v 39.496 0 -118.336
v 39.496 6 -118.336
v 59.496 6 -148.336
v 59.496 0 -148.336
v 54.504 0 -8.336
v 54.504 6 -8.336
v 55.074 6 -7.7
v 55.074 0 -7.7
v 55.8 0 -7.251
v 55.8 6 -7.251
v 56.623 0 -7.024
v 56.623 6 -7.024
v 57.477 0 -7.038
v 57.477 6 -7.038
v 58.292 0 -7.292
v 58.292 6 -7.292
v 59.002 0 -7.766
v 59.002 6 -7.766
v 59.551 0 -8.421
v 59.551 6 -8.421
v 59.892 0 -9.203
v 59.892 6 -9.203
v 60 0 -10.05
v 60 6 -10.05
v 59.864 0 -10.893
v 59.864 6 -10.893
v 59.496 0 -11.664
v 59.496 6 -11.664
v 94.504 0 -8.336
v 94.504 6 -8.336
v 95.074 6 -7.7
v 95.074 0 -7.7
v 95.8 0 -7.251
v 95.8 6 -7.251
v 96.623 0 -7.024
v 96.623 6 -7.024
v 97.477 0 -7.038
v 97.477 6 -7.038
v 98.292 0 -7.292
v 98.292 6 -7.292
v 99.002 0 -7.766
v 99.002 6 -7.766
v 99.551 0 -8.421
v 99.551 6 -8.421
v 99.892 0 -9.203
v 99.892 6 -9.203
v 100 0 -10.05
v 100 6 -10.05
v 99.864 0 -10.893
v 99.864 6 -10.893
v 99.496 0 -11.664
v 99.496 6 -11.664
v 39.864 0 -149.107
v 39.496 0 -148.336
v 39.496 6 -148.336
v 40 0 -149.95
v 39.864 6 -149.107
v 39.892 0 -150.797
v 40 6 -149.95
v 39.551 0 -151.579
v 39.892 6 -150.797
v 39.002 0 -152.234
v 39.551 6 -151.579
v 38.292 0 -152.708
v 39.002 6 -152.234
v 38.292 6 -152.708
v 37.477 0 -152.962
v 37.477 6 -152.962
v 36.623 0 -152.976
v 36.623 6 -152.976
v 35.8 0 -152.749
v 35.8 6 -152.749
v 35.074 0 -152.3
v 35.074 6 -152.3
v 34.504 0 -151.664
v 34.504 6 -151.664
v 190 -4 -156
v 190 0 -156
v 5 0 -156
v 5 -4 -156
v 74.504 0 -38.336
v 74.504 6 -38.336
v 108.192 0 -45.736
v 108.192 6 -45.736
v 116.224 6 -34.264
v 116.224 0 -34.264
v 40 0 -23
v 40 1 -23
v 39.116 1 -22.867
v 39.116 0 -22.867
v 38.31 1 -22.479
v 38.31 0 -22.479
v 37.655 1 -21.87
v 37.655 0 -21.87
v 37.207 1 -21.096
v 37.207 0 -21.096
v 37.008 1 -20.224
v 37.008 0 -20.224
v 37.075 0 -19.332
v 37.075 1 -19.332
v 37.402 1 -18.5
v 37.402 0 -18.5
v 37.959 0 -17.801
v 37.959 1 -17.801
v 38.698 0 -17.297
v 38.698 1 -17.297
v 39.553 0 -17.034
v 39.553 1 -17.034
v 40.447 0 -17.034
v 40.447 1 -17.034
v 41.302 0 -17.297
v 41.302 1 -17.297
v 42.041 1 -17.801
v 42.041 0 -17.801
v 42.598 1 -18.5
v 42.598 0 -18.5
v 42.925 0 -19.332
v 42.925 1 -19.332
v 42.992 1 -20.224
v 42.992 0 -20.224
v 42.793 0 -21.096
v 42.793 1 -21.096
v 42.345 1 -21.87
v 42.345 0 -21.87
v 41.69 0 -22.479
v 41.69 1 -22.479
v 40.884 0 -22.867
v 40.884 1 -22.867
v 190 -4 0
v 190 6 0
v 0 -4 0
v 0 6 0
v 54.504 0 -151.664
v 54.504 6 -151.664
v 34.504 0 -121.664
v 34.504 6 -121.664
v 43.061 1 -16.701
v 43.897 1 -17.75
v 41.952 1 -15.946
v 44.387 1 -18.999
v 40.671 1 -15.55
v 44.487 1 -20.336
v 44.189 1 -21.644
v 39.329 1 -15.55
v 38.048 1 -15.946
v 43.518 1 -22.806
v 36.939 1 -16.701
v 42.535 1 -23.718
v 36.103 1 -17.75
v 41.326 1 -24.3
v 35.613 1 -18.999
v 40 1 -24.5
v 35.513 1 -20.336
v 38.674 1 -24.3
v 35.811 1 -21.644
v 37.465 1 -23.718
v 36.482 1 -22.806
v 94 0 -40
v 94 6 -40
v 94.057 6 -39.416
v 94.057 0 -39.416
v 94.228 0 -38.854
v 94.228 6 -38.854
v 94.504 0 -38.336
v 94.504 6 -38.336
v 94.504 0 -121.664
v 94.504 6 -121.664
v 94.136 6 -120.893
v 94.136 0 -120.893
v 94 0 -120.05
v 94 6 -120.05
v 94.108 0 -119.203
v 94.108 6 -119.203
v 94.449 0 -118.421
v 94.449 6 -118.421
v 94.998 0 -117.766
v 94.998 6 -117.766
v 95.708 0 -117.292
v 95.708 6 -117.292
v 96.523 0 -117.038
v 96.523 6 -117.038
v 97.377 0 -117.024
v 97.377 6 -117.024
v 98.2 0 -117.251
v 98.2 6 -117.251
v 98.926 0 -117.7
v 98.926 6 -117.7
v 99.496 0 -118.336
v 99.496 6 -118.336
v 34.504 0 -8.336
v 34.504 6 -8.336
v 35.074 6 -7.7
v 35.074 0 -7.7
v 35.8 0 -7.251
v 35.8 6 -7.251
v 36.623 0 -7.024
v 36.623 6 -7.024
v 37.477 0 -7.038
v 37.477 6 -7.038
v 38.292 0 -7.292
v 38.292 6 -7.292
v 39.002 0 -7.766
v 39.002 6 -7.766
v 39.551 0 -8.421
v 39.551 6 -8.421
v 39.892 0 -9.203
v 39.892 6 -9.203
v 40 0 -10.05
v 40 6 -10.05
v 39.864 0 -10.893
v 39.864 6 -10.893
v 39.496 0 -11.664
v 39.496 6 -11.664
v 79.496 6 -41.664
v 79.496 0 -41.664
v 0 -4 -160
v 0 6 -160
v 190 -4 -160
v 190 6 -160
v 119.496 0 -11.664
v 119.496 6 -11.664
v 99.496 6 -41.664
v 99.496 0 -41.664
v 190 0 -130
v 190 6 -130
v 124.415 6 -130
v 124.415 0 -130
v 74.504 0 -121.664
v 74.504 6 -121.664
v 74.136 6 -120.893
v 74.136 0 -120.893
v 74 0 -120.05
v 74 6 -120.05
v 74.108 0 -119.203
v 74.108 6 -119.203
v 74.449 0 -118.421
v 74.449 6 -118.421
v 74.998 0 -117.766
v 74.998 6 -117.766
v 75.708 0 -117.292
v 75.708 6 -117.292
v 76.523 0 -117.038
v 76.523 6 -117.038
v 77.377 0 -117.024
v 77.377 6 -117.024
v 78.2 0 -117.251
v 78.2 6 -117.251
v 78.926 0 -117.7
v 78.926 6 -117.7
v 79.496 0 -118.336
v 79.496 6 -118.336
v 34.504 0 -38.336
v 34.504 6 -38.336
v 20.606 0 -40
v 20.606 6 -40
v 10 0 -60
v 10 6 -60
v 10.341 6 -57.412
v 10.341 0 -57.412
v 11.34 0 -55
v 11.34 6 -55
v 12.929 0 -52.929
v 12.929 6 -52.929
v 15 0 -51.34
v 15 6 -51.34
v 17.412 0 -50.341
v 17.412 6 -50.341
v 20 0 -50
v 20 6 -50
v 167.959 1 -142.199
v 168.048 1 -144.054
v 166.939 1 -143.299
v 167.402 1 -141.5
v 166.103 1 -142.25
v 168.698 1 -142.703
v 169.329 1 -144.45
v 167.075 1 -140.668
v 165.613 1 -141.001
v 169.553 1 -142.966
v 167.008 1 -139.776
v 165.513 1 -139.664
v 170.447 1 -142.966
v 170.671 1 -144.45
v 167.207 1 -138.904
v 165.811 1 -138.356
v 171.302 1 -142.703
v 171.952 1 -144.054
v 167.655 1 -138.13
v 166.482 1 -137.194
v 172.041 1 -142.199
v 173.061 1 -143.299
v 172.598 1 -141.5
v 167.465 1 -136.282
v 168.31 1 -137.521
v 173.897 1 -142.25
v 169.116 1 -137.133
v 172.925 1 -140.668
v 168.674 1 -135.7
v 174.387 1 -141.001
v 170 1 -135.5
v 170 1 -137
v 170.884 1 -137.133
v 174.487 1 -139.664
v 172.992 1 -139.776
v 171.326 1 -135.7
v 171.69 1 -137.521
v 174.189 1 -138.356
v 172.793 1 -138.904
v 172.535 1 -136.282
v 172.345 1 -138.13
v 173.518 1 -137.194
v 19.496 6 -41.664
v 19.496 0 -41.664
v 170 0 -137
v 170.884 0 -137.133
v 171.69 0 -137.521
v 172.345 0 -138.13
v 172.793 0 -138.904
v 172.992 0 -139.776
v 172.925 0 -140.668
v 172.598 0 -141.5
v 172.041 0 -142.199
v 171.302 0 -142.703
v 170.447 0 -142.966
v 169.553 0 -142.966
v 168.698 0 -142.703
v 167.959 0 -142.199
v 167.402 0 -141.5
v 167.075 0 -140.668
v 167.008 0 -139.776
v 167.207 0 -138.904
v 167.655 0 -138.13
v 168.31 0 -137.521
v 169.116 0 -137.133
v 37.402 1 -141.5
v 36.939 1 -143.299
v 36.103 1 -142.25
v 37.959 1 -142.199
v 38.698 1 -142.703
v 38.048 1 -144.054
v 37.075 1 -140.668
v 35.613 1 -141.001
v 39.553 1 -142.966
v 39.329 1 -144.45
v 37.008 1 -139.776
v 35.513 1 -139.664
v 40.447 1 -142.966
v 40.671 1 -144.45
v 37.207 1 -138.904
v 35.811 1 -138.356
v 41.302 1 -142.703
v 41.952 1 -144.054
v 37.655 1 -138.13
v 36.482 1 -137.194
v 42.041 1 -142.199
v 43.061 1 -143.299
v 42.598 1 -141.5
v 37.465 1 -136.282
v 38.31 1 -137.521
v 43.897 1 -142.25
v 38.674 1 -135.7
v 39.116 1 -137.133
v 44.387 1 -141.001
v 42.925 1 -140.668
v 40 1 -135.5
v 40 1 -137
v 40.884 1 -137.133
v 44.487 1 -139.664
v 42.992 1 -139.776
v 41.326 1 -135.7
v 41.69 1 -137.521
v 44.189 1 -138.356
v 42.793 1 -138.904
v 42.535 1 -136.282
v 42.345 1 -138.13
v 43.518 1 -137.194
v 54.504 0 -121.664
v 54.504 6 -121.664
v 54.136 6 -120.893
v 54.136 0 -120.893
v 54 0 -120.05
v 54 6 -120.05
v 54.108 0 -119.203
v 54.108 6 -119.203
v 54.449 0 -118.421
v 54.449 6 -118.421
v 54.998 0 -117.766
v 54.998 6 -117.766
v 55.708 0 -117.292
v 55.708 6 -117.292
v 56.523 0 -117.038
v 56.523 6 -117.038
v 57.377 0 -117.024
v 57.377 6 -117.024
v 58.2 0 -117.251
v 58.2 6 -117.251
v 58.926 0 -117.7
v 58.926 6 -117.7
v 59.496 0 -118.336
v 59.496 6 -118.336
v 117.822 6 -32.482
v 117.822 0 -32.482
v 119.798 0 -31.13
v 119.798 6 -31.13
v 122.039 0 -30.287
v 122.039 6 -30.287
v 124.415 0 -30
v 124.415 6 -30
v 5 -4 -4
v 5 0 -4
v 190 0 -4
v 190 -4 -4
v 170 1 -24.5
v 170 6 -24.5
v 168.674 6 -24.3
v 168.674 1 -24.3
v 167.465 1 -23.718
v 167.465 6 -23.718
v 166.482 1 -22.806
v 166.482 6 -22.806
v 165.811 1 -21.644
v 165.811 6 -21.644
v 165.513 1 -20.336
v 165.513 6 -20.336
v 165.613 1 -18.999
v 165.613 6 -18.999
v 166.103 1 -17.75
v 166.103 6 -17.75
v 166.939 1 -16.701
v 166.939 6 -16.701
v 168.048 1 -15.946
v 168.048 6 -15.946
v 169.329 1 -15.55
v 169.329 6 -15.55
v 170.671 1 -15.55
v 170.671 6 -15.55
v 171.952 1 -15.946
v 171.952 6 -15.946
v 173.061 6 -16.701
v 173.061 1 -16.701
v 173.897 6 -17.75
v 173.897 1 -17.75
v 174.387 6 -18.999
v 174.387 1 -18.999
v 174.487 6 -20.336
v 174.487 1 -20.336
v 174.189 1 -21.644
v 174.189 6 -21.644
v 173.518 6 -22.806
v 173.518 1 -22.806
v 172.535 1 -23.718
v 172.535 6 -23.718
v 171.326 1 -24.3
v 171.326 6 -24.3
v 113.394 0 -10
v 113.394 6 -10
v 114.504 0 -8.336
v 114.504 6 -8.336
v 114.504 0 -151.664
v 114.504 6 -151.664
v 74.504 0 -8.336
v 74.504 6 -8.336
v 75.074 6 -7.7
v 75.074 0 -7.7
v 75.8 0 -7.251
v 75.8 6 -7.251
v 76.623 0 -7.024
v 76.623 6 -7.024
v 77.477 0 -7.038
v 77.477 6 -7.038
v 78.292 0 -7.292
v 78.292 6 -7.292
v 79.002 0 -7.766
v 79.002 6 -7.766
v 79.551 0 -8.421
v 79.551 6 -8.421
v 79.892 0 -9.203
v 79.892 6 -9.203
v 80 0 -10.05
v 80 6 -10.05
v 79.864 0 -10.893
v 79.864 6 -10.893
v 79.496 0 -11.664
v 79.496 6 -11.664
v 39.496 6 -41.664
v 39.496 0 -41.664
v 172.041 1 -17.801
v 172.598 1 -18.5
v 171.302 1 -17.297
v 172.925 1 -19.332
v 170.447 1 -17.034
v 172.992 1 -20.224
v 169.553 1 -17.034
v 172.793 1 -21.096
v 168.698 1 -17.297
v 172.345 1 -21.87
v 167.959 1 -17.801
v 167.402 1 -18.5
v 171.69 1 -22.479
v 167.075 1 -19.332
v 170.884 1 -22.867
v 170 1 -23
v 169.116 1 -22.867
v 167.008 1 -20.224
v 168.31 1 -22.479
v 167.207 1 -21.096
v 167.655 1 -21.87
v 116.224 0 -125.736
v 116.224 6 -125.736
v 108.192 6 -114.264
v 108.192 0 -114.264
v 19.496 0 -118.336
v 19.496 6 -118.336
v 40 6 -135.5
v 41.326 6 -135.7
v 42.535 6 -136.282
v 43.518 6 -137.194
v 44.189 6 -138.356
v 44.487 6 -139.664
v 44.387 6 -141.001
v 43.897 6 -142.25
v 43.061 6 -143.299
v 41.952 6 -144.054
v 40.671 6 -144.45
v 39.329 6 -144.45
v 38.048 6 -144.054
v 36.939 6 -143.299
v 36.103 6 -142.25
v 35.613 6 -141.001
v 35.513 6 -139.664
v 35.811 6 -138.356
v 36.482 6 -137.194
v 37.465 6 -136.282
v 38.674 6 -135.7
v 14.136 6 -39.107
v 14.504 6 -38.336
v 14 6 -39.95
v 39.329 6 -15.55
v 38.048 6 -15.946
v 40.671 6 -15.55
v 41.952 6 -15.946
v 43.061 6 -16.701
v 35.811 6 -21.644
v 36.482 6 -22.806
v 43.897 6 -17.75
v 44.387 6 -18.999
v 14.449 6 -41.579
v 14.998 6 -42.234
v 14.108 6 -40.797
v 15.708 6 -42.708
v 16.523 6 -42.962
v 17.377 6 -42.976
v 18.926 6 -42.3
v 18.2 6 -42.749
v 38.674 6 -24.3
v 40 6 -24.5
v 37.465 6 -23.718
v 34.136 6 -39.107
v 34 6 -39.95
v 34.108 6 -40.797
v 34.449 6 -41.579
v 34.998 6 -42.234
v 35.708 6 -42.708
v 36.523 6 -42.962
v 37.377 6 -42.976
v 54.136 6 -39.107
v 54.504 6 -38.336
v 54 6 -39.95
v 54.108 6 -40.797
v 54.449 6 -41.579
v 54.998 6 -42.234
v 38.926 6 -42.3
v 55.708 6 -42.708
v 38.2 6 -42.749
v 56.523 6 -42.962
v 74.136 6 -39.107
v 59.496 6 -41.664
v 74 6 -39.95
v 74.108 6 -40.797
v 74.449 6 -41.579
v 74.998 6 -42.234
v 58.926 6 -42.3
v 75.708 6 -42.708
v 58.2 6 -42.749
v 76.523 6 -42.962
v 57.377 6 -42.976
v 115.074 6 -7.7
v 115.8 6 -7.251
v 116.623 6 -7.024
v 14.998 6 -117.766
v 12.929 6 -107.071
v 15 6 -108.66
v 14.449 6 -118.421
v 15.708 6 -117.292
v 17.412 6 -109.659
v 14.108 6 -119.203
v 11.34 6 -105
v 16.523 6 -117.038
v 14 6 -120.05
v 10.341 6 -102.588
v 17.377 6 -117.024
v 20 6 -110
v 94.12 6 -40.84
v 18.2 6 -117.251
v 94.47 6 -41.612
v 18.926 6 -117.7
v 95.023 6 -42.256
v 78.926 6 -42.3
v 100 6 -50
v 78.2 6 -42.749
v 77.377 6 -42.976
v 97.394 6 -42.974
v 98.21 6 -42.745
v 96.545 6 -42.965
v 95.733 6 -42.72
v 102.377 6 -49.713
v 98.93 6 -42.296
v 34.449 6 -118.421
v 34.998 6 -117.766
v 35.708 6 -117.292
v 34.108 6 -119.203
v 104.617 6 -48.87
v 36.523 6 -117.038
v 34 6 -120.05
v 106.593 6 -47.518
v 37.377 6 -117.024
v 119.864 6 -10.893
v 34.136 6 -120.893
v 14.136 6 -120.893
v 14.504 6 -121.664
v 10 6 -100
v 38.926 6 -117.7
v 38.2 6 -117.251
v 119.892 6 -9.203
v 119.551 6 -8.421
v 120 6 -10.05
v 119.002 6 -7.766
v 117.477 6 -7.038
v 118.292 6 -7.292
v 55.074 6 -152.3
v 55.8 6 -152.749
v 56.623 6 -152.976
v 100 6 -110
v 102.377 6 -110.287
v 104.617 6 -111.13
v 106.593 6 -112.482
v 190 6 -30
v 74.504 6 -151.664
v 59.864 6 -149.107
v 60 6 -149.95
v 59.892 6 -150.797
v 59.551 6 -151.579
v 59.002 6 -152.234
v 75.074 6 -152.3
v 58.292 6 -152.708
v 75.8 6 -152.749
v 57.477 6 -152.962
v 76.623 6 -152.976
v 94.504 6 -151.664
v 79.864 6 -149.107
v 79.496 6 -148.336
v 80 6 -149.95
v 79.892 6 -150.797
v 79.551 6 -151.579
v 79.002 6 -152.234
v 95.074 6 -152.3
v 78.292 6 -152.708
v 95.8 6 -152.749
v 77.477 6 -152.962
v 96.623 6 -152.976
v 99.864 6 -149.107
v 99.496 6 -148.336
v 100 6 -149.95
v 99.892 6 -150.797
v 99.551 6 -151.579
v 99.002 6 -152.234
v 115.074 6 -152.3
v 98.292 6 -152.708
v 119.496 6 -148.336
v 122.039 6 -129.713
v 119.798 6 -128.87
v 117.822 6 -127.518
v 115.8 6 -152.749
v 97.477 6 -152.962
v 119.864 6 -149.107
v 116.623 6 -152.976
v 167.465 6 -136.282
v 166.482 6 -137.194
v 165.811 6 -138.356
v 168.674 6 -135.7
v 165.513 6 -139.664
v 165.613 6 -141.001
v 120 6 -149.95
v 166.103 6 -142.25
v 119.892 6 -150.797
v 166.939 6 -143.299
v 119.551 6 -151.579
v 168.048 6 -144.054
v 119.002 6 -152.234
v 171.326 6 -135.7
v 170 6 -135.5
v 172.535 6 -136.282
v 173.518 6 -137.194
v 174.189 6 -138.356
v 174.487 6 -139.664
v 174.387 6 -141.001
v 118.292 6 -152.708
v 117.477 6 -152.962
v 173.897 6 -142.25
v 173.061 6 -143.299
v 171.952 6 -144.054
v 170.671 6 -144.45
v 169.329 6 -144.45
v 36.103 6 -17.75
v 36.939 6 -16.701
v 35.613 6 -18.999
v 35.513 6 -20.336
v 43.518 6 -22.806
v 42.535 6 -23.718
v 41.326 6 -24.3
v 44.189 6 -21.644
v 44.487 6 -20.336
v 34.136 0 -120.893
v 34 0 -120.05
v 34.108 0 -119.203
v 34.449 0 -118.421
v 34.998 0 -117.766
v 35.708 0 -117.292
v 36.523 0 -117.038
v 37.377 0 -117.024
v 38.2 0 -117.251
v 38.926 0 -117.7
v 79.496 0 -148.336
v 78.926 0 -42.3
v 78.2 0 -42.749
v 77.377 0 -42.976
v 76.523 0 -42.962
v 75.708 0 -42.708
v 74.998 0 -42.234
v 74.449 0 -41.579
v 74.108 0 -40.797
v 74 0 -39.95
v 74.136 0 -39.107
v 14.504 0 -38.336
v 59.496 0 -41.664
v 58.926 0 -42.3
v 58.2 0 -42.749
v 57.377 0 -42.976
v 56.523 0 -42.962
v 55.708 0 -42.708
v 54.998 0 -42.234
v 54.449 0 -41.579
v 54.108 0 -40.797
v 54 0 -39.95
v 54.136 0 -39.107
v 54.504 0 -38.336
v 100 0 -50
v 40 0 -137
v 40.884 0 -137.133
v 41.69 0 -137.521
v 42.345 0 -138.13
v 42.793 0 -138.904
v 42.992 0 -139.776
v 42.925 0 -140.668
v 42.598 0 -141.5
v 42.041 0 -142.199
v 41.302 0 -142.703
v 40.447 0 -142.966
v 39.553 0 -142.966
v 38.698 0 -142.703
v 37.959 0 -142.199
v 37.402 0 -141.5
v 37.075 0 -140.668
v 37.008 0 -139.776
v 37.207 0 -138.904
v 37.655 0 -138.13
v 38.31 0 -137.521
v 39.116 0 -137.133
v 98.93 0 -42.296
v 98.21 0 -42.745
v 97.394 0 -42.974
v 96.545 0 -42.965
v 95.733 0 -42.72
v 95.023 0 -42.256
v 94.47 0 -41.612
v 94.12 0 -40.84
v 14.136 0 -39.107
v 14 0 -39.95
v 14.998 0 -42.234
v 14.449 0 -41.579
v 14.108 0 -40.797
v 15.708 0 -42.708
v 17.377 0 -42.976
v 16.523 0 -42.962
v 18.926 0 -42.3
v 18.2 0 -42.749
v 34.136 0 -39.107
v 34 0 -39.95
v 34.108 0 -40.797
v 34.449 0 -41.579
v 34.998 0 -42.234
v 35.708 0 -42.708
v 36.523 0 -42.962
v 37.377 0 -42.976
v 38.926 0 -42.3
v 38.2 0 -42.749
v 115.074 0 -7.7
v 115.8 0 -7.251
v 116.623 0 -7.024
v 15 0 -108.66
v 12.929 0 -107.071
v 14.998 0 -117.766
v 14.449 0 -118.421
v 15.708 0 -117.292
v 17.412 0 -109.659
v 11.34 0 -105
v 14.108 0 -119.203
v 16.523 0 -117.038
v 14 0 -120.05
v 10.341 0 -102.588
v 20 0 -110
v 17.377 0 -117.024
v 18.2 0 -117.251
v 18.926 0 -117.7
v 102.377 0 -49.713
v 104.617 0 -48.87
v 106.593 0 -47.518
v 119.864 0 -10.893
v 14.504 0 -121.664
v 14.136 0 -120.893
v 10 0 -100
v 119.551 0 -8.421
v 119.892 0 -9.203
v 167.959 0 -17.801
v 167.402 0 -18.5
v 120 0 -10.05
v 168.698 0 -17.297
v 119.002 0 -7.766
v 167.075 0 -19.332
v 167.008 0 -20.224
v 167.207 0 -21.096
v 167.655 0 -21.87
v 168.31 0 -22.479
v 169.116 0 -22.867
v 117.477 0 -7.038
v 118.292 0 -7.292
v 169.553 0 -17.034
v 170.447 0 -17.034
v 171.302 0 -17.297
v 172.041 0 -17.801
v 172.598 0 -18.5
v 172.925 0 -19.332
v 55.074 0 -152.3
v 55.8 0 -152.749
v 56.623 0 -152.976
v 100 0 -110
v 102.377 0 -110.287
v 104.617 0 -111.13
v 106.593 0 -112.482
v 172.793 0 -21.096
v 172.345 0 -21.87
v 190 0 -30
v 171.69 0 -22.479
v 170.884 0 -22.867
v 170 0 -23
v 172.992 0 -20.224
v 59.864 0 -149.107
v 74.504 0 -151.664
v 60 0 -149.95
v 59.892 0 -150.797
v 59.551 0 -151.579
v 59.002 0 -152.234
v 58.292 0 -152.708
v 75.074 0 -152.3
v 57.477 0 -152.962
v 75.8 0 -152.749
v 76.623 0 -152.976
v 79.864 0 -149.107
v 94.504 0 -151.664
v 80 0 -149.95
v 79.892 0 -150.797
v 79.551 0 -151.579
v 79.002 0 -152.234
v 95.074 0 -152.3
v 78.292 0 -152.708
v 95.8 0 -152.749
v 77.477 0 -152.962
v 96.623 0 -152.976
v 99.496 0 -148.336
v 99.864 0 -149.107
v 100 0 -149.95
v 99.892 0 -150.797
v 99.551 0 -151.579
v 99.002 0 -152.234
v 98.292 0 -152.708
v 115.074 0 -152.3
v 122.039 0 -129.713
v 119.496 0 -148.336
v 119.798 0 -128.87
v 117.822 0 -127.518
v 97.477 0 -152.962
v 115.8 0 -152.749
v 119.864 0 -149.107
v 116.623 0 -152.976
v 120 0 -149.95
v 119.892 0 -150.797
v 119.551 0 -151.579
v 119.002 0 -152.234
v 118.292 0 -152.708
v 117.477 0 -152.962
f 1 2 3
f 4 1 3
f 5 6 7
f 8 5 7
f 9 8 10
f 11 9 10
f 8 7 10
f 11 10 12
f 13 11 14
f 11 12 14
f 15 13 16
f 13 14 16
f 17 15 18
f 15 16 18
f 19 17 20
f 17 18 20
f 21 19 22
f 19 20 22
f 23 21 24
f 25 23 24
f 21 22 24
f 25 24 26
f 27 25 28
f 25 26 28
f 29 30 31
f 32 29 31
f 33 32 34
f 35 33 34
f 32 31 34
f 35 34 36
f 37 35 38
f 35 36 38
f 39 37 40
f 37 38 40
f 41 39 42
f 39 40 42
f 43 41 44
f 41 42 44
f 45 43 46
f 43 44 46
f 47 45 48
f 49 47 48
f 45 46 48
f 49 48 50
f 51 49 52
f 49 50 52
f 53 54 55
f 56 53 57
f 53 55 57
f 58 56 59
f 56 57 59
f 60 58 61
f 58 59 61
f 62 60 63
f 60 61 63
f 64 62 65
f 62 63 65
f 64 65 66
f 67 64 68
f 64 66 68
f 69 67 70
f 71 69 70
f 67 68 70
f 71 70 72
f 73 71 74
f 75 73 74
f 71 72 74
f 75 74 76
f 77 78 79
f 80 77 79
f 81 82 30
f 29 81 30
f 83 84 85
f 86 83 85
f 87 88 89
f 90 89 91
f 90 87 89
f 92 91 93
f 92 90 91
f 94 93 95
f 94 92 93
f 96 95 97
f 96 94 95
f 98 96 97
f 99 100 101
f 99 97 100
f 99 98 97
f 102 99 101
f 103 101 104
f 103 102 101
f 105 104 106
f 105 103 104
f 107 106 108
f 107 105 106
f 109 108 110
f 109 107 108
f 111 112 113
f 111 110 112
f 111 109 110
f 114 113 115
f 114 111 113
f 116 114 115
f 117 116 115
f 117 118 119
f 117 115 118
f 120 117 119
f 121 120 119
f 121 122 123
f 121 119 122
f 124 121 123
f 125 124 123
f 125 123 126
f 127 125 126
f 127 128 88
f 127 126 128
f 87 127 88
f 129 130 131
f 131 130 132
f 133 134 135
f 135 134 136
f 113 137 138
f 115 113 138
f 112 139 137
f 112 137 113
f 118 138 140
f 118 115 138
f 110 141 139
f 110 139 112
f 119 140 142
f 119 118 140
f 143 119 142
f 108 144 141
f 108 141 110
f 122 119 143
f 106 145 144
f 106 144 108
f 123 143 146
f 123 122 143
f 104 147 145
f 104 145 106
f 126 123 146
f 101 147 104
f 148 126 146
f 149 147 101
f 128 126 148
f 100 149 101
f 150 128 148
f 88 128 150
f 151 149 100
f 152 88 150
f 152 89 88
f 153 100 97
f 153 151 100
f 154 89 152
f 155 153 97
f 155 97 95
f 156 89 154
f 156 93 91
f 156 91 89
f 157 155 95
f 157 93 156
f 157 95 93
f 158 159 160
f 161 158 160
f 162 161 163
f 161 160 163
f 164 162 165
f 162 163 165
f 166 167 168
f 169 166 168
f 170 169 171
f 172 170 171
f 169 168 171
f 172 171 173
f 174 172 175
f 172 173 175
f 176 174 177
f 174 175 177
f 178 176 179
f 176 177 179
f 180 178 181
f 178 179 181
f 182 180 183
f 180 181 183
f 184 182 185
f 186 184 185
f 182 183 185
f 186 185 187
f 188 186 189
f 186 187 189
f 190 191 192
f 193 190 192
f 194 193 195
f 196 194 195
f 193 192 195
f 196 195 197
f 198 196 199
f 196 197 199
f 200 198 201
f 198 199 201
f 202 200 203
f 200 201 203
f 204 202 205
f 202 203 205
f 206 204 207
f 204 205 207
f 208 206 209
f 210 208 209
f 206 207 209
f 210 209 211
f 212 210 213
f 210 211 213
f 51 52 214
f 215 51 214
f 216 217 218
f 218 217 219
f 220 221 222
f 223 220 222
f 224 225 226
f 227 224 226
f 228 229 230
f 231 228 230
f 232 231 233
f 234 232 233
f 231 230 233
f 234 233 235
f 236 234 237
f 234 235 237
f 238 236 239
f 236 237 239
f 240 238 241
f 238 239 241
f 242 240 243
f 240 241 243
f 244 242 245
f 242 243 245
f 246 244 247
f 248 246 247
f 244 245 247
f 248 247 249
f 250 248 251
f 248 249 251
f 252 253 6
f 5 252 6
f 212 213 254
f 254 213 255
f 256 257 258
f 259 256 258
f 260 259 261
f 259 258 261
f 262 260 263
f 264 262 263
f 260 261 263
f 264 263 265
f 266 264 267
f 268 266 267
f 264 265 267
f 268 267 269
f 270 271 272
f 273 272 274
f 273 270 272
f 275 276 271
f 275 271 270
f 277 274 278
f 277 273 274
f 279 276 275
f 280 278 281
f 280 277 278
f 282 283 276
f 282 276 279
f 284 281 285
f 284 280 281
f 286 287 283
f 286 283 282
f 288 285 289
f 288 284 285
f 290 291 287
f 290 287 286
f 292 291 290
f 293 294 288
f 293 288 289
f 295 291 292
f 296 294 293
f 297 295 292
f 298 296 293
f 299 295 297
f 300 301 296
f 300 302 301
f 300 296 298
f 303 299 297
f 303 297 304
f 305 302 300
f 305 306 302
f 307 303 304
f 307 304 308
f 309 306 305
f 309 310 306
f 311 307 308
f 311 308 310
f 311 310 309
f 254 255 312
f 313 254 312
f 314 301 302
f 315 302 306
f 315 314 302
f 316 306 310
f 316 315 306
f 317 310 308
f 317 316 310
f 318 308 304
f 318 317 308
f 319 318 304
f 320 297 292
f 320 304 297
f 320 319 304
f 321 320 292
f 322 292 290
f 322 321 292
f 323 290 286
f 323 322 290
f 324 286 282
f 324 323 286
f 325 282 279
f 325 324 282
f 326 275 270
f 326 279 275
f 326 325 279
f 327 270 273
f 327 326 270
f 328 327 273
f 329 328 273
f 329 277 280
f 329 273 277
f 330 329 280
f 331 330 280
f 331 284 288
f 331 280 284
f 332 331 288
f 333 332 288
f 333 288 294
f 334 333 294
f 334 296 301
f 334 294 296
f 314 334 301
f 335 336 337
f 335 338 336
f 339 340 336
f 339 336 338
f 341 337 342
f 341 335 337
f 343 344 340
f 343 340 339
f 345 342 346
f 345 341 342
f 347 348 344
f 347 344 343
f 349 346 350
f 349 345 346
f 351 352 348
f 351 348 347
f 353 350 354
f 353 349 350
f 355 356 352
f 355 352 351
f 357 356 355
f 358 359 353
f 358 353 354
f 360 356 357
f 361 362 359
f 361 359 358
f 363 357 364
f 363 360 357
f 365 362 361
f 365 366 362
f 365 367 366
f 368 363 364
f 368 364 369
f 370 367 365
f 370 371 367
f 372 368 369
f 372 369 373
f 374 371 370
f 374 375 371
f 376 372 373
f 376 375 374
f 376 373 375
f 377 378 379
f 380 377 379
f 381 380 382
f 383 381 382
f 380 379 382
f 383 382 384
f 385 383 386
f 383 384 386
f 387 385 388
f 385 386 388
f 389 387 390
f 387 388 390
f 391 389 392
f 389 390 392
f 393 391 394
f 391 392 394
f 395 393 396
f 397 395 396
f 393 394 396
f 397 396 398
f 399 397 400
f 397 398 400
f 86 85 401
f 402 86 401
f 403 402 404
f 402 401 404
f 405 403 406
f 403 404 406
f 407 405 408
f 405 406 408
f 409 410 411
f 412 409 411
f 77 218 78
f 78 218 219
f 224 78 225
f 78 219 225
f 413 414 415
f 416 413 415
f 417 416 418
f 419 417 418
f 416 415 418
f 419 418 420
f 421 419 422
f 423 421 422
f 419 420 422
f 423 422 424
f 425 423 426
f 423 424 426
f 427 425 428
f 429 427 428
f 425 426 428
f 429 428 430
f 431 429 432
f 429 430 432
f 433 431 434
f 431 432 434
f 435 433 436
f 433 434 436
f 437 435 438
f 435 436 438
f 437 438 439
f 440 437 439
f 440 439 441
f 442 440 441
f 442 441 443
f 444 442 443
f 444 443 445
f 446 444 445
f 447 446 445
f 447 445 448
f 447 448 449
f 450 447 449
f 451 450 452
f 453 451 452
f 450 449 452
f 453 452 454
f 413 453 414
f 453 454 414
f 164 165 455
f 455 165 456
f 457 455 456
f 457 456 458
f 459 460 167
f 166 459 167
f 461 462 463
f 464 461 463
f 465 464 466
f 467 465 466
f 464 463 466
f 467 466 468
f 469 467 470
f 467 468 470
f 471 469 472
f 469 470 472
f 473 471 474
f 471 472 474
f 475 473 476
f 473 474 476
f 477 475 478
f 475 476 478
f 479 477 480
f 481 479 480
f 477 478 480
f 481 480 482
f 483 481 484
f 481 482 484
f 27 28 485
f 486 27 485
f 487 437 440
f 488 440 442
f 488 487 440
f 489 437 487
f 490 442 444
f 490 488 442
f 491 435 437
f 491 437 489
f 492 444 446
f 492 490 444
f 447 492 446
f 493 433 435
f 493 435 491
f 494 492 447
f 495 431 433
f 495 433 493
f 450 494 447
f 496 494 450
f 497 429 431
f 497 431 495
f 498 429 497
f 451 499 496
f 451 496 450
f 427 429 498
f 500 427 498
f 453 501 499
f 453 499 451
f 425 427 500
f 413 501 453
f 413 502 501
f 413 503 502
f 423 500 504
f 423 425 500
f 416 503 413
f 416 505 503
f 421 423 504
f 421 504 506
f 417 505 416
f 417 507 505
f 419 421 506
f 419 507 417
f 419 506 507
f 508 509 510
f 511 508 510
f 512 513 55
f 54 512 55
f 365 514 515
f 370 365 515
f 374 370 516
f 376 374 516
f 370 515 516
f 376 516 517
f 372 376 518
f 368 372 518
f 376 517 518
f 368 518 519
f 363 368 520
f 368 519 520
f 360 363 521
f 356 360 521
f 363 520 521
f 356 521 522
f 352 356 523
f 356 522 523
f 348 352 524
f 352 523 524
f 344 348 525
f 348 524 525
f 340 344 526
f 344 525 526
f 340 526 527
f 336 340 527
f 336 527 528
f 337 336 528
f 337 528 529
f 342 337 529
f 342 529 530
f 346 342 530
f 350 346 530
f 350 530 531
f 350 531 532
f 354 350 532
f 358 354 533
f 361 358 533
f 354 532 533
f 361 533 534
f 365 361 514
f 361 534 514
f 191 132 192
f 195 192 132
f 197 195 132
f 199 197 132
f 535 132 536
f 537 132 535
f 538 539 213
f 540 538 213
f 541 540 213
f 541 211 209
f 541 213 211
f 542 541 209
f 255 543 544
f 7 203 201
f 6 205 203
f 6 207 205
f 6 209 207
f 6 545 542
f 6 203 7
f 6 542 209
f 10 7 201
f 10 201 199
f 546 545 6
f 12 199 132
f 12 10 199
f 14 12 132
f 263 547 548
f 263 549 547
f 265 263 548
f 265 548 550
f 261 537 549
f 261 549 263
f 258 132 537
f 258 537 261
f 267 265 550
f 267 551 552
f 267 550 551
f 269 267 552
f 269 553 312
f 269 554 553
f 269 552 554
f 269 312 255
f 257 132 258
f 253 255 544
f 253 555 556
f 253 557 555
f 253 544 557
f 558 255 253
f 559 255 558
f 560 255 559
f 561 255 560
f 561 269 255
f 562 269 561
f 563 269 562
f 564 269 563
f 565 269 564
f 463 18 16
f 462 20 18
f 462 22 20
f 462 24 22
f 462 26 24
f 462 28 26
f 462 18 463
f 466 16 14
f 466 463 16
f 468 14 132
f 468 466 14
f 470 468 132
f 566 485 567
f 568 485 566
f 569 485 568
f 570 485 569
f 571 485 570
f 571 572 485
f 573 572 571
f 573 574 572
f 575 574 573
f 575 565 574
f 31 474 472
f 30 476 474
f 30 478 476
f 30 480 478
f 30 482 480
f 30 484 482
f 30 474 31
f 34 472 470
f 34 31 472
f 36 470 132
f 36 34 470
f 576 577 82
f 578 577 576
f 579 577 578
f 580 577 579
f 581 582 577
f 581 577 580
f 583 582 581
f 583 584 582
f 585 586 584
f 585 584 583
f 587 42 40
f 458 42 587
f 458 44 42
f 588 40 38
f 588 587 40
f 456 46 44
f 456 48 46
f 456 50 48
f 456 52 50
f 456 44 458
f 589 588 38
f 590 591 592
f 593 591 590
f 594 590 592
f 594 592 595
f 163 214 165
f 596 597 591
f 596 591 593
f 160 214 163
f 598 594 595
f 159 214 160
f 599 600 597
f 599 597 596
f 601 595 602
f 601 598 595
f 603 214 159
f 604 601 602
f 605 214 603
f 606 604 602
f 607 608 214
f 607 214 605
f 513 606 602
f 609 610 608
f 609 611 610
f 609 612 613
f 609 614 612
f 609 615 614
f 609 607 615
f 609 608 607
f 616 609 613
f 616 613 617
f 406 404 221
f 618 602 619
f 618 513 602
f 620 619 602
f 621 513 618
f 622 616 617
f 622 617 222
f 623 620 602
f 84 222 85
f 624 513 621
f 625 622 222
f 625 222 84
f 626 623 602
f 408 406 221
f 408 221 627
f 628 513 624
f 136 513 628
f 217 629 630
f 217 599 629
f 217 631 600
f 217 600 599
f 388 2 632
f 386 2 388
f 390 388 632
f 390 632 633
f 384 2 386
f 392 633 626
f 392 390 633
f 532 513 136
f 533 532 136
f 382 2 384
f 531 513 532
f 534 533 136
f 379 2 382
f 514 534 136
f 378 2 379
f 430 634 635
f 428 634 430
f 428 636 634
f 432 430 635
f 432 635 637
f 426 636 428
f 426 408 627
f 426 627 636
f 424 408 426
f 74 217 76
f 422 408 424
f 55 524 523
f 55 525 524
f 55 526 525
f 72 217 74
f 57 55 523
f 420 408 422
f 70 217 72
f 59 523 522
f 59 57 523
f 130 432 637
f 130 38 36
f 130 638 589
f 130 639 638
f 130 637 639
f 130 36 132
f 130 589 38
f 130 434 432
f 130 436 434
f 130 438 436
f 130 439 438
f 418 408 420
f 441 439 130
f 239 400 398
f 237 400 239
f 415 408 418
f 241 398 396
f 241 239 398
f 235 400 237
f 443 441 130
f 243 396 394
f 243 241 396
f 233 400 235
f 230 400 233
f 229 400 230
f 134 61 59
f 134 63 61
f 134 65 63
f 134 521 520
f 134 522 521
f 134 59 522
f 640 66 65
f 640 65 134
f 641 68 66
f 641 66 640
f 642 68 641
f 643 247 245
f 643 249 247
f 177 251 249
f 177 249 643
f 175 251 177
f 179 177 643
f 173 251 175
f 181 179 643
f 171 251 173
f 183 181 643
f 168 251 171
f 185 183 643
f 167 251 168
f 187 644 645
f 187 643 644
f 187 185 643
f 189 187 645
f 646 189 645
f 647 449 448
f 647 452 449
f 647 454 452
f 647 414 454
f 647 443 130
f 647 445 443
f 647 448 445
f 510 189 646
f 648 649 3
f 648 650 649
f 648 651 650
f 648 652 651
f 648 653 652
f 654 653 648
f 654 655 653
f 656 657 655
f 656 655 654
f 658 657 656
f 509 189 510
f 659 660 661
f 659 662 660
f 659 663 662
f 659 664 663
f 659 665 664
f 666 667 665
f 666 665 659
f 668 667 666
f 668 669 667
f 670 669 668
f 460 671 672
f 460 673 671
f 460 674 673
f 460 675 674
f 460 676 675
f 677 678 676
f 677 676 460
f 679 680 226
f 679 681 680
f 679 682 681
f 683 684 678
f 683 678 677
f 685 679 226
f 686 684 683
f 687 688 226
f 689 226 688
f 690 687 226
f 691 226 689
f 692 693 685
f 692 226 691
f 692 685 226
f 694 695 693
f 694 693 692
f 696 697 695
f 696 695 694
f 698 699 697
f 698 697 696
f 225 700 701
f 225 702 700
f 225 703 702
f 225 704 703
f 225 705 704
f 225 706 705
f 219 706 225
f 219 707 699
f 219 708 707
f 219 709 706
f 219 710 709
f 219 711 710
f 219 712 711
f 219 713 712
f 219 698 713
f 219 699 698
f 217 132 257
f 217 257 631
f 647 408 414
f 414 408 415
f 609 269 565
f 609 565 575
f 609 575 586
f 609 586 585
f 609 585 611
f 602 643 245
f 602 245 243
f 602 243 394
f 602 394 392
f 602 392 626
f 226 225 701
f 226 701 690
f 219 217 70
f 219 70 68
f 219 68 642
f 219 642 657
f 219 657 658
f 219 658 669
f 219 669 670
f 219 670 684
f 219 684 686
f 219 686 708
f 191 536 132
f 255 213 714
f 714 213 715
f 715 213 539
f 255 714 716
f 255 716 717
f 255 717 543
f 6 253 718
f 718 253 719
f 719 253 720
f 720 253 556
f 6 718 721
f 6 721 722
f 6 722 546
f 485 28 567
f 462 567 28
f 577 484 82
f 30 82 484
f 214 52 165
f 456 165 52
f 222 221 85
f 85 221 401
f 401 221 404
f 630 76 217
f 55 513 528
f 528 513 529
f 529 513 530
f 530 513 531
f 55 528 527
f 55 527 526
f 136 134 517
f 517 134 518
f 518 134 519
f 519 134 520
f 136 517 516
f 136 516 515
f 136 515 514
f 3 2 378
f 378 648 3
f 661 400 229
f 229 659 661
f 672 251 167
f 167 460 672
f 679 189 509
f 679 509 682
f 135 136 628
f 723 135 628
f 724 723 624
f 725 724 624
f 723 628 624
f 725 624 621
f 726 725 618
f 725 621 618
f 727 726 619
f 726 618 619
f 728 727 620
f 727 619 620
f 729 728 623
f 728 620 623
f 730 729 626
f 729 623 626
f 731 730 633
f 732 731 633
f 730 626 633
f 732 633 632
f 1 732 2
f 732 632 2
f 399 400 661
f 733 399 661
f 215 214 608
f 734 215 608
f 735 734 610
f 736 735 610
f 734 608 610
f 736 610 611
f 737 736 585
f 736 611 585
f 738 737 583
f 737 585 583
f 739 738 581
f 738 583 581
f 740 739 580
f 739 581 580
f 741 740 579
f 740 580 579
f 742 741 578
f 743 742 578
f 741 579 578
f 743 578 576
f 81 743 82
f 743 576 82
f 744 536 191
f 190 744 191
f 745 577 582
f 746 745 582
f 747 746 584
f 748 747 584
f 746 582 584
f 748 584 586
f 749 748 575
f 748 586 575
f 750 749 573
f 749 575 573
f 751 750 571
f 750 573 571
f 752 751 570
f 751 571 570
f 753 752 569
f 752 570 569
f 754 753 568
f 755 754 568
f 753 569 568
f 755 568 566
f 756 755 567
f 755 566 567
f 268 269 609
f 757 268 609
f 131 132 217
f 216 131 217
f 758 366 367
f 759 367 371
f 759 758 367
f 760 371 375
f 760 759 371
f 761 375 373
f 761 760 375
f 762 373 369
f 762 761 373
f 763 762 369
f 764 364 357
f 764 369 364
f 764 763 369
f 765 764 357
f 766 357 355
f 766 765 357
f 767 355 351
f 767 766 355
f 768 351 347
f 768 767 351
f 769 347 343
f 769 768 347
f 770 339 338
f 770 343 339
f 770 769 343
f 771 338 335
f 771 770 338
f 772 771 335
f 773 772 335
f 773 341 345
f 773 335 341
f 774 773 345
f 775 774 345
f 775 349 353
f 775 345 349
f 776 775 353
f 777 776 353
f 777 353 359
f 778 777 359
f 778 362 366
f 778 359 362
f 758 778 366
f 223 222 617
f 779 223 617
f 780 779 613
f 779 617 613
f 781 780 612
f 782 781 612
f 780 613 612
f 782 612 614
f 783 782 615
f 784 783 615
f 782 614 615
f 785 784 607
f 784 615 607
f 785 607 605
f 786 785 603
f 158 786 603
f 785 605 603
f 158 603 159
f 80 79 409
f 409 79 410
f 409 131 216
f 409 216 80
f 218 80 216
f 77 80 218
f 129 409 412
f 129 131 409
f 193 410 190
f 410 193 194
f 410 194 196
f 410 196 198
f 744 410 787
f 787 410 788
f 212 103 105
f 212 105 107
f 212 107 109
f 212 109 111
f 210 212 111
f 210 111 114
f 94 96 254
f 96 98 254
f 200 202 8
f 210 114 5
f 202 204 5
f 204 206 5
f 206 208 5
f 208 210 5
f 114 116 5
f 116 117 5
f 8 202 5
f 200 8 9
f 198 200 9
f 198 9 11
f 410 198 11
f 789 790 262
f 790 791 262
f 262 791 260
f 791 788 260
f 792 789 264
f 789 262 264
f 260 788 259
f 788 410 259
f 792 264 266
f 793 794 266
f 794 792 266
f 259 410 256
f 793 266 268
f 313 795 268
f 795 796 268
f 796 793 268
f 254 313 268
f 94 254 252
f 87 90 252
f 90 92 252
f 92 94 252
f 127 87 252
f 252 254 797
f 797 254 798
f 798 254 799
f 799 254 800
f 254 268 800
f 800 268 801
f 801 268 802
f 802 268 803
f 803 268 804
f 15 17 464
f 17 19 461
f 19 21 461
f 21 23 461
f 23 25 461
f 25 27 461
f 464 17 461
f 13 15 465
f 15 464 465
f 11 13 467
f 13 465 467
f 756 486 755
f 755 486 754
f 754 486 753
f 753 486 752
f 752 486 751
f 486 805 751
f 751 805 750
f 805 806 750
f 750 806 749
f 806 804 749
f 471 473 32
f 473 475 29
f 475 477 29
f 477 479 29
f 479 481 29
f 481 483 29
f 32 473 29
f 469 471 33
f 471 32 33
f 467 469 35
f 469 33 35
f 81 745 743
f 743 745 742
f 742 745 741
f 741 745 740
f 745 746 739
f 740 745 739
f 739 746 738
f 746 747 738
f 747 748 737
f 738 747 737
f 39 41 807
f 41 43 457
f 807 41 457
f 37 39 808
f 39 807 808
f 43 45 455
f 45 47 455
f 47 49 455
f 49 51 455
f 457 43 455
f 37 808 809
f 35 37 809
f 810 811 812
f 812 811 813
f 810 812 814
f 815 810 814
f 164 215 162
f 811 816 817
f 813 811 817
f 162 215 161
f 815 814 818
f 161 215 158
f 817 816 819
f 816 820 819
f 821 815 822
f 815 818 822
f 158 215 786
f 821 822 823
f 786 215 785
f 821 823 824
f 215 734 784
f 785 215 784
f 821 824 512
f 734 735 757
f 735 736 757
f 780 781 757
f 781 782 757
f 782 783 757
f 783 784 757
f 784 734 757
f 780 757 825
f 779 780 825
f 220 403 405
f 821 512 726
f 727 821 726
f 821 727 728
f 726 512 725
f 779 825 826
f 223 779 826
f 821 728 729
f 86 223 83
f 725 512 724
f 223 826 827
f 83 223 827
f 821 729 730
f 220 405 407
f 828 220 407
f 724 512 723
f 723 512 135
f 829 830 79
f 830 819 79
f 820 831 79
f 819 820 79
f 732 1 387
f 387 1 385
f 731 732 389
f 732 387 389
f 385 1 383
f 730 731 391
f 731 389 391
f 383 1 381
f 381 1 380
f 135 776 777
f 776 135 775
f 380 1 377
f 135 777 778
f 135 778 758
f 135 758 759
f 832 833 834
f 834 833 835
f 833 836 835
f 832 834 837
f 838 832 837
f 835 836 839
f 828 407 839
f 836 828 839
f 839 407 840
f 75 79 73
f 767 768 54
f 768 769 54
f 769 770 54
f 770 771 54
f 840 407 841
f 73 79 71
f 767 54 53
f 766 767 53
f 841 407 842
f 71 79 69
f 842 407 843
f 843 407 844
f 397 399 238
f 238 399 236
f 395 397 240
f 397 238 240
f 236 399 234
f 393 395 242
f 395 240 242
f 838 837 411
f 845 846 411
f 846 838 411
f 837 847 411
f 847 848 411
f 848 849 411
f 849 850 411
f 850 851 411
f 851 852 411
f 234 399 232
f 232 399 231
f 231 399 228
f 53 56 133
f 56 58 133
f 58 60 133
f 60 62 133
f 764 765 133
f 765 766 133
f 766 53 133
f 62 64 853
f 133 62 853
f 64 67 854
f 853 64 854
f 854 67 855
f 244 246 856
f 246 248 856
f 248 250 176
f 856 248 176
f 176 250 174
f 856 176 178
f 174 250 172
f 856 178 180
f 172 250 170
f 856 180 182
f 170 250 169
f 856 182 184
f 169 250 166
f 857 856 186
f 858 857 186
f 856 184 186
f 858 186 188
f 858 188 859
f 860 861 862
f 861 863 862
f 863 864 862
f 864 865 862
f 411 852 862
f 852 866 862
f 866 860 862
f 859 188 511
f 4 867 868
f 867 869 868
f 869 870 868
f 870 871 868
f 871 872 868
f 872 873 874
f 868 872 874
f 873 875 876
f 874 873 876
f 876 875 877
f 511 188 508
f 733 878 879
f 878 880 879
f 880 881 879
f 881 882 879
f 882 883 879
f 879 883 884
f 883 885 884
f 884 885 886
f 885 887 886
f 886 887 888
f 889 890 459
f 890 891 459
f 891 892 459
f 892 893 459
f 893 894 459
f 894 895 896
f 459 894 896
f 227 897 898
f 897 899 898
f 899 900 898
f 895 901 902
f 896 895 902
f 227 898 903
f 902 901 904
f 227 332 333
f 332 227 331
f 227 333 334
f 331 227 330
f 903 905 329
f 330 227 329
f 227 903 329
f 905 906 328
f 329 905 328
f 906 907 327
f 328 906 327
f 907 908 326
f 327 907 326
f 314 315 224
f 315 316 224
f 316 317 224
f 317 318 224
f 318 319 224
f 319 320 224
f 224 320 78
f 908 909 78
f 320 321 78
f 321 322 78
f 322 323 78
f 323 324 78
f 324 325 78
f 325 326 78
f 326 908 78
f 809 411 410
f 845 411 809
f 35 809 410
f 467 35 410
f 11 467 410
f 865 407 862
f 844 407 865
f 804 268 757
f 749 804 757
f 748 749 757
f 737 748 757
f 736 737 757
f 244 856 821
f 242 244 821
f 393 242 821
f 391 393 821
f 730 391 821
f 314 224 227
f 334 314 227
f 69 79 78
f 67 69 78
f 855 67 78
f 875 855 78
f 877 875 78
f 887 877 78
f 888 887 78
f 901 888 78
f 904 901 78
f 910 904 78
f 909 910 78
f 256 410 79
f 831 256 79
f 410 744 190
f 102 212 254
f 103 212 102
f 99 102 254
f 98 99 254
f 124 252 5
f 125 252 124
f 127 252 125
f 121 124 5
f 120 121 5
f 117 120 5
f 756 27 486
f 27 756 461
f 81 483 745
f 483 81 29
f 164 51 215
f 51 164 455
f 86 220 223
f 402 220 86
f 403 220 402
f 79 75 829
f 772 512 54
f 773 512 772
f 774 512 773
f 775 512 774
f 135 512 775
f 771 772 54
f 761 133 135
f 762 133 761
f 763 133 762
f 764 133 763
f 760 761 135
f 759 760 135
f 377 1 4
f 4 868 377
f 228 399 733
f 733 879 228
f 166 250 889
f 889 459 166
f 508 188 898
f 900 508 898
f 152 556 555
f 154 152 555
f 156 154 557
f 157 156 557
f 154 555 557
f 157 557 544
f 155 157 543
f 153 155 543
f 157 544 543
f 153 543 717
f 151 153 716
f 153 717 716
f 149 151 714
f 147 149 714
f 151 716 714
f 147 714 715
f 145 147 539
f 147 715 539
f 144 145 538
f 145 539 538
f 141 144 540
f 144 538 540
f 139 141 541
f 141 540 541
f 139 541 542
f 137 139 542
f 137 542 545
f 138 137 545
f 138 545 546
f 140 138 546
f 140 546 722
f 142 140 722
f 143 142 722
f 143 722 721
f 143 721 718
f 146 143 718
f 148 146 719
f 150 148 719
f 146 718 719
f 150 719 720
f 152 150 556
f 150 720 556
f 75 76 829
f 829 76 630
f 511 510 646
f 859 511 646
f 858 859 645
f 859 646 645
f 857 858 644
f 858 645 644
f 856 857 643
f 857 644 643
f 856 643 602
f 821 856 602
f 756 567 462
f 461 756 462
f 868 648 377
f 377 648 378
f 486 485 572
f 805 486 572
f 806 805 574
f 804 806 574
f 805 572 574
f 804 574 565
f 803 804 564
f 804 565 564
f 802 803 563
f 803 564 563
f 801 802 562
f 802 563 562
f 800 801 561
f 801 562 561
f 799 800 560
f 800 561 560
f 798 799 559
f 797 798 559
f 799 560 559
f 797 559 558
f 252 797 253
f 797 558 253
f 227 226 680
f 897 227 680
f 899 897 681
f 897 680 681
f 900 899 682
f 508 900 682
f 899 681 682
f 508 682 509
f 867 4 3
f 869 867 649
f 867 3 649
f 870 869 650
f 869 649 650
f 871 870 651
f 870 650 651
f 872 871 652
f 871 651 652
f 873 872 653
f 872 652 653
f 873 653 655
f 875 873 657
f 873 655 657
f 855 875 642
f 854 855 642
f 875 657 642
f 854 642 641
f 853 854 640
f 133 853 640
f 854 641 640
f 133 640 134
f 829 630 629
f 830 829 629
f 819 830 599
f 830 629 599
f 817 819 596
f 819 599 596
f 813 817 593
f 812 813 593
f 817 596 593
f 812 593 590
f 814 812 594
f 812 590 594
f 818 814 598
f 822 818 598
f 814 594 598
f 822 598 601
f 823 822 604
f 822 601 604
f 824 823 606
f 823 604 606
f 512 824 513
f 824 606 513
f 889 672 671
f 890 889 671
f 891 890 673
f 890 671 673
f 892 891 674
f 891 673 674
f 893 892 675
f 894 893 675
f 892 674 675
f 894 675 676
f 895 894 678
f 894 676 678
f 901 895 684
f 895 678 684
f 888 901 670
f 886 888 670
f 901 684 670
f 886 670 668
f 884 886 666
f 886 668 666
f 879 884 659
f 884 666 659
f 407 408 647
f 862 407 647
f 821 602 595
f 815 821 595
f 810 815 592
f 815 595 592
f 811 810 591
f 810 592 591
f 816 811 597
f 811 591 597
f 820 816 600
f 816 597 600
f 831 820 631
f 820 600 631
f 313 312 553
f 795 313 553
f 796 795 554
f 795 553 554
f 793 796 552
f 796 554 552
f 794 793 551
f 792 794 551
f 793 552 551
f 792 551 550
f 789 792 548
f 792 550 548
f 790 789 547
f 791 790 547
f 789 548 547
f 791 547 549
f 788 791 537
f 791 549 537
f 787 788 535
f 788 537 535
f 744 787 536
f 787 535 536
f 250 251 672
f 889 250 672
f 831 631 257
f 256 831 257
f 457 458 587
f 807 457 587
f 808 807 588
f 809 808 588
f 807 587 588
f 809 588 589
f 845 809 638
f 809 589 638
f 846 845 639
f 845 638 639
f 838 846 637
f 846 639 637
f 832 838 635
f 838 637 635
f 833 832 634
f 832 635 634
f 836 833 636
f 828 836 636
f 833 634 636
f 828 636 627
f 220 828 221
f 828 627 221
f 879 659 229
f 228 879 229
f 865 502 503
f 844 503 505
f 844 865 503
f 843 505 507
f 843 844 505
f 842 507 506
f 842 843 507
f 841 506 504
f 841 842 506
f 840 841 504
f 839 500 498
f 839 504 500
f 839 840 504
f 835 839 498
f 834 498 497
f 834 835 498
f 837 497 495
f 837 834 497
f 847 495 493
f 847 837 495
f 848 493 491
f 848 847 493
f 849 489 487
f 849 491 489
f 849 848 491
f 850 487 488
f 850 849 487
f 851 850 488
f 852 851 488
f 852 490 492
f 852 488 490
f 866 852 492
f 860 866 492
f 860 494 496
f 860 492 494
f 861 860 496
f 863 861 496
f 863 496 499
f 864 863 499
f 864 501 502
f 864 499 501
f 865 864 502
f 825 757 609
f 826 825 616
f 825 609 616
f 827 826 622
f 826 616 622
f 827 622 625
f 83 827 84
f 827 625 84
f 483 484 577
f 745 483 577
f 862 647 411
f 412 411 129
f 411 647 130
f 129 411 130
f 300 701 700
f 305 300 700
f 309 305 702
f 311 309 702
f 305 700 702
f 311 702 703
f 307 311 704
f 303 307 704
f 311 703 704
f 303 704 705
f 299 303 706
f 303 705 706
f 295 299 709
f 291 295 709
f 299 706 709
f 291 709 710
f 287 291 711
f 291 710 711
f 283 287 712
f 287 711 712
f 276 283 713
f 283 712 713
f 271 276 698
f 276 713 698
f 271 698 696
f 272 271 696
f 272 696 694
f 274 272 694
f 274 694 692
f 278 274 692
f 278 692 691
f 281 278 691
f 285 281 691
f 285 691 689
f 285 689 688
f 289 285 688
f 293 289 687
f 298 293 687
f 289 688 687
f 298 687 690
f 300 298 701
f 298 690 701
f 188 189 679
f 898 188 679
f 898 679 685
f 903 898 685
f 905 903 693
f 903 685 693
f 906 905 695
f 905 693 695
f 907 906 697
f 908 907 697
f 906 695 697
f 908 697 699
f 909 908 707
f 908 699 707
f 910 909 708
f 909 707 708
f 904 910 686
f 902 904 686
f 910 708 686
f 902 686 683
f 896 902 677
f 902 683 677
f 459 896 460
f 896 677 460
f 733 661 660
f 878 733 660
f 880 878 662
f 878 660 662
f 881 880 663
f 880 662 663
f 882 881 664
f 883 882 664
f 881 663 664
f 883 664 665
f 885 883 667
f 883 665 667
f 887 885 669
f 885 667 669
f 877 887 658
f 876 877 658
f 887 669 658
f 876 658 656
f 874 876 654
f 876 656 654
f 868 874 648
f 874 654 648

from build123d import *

# Parameters (mm, degrees)
SKETCH1_W           = 190
SKETCH1_H           = 160
BOSS_EXTRUDE1_DEPTH = 6
CUT_EXTRUDE1_DEPTH  = 10
SKETCH3_W           = 185
SKETCH3_H           = 4
SKETCH3_W_2         = 5
SKETCH3_H_2         = 152
BOSS_EXTRUDE3_DEPTH = 4
SKETCH4_R           = 4.5
CUT_EXTRUDE2_DEPTH  = 5
SKETCH5_R           = 3
CUT_EXTRUDE7_DEPTH  = 5


with BuildPart() as part:
    # Sketch1 → Boss-Extrude1 (new body)
    with BuildSketch(Plane(origin=(0, 0, 0), x_dir=(1, 0, 0), z_dir=(0, 1, 0))):
        with Locations((95, 80)):
            Rectangle(SKETCH1_W, SKETCH1_H)
    extrude(amount=BOSS_EXTRUDE1_DEPTH)

    # Sketch2 → Cut-Extrude1 (cut)
    with BuildSketch(Plane(origin=(0, 6, 0), x_dir=(1, 0, 0), z_dir=(0, 1, 0))):
        with BuildLine():
            ThreePointArc((34.503849117, 8.335899411), (38.664100589, 7.503849117), (39.496150883, 11.664100589))
            Line((39.496150883, 11.664100589), (20.605551275, 40))
            Line((20.605551275, 40), (19.496150883, 41.664100589))
            ThreePointArc((19.496150883, 41.664100589), (15.335899411, 42.496150883), (14.503849117, 38.335899411))
            Line((14.503849117, 38.335899411), (34.503849117, 8.335899411))
        make_face()
        with BuildLine():
            Line((10, 100), (10, 60))
            ThreePointArc((10, 60), (12.928932188, 52.928932188), (20, 50))
            Line((20, 50), (100, 50))
            ThreePointArc((100, 50), (104.617486132, 48.870108332), (108.191520443, 45.735764364))
            Line((108.191520443, 45.735764364), (116.223971332, 34.264235636))
            ThreePointArc((116.223971332, 34.264235636), (119.798005643, 31.129891668), (124.415491775, 30))
            Line((124.415491775, 30), (190, 30))
            Line((190, 30), (190, 130))
            Line((190, 130), (124.415491775, 130))
            ThreePointArc((124.415491775, 130), (119.798005643, 128.870108332), (116.223971332, 125.735764364))
            Line((116.223971332, 125.735764364), (108.191520443, 114.264235636))
            ThreePointArc((108.191520443, 114.264235636), (104.617486132, 111.129891668), (100, 110))
            Line((100, 110), (20, 110))
            ThreePointArc((20, 110), (12.928932188, 107.071067812), (10, 100))
        make_face()
        with BuildLine():
            Line((34.503849117, 38.335899411), (54.503849117, 8.335899411))
            ThreePointArc((54.503849117, 8.335899411), (58.664100589, 7.503849117), (59.496150883, 11.664100589))
            Line((59.496150883, 11.664100589), (39.496150883, 41.664100589))
            ThreePointArc((39.496150883, 41.664100589), (35.335899411, 42.496150883), (34.503849117, 38.335899411))
        make_face()
        with BuildLine():
            Line((54.503849117, 38.335899411), (74.503849117, 8.335899411))
            ThreePointArc((74.503849117, 8.335899411), (78.664100589, 7.503849117), (79.496150883, 11.664100589))
            Line((79.496150883, 11.664100589), (59.496150883, 41.664100589))
            ThreePointArc((59.496150883, 41.664100589), (55.335899411, 42.496150883), (54.503849117, 38.335899411))
        make_face()
        with BuildLine():
            Line((74.503849117, 38.335899411), (94.503849117, 8.335899411))
            ThreePointArc((94.503849117, 8.335899411), (98.664100589, 7.503849117), (99.496150883, 11.664100589))
            Line((99.496150883, 11.664100589), (79.496150883, 41.664100589))
            ThreePointArc((79.496150883, 41.664100589), (75.335899411, 42.496150883), (74.503849117, 38.335899411))
        make_face()
        with BuildLine():
            Line((94.503849117, 38.335899411), (113.394448725, 10))
            Line((113.394448725, 10), (114.503849117, 8.335899411))
            ThreePointArc((114.503849117, 8.335899411), (118.664100589, 7.503849117), (119.496150883, 11.664100589))
            Line((119.496150883, 11.664100589), (99.496150883, 41.664100589))
            ThreePointArc((99.496150883, 41.664100589), (96.130647554, 42.871276079), (94, 40))
            ThreePointArc((94, 40), (94.128723921, 39.130647554), (94.503849117, 38.335899411))
        make_face()
        with BuildLine():
            ThreePointArc((94.503849117, 121.664100589), (95.335899411, 117.503849117), (99.496150883, 118.335899411))
            Line((99.496150883, 118.335899411), (119.496150883, 148.335899411))
            ThreePointArc((119.496150883, 148.335899411), (118.664100589, 152.496150883), (114.503849117, 151.664100589))
            Line((114.503849117, 151.664100589), (94.503849117, 121.664100589))
        make_face()
        with BuildLine():
            ThreePointArc((74.503849117, 121.664100589), (75.335899411, 117.503849117), (79.496150883, 118.335899411))
            Line((79.496150883, 118.335899411), (99.496150883, 148.335899411))
            ThreePointArc((99.496150883, 148.335899411), (98.664100589, 152.496150883), (94.503849117, 151.664100589))
            Line((94.503849117, 151.664100589), (74.503849117, 121.664100589))
        make_face()
        with BuildLine():
            ThreePointArc((54.503849117, 121.664100589), (55.335899411, 117.503849117), (59.496150883, 118.335899411))
            Line((59.496150883, 118.335899411), (79.496150883, 148.335899411))
            ThreePointArc((79.496150883, 148.335899411), (78.664100589, 152.496150883), (74.503849117, 151.664100589))
            Line((74.503849117, 151.664100589), (54.503849117, 121.664100589))
        make_face()
        with BuildLine():
            ThreePointArc((34.503849117, 121.664100589), (35.335899411, 117.503849117), (39.496150883, 118.335899411))
            Line((39.496150883, 118.335899411), (59.496150883, 148.335899411))
            ThreePointArc((59.496150883, 148.335899411), (58.664100589, 152.496150883), (54.503849117, 151.664100589))
            Line((54.503849117, 151.664100589), (34.503849117, 121.664100589))
        make_face()
        with BuildLine():
            ThreePointArc((14.503849117, 121.664100589), (15.335899411, 117.503849117), (19.496150883, 118.335899411))
            Line((19.496150883, 118.335899411), (39.496150883, 148.335899411))
            ThreePointArc((39.496150883, 148.335899411), (38.664100589, 152.496150883), (34.503849117, 151.664100589))
            Line((34.503849117, 151.664100589), (14.503849117, 121.664100589))
        make_face()
    extrude(amount=-CUT_EXTRUDE1_DEPTH, mode=Mode.SUBTRACT)

    # Sketch3 → Boss-Extrude3 (add)
    with BuildSketch(Plane.XZ):
        with Locations((97.5, -158)):
            Rectangle(SKETCH3_W, SKETCH3_H)
        with Locations((2.5, -158)):
            Rectangle(SKETCH3_W_2, SKETCH3_H)
        with Locations((2.5, -80)):
            Rectangle(SKETCH3_W_2, SKETCH3_H_2)
        with Locations((97.5, -2)):
            Rectangle(SKETCH3_W, SKETCH3_H)
        with Locations((2.5, -2)):
            Rectangle(SKETCH3_W_2, SKETCH3_H)
    extrude(amount=BOSS_EXTRUDE3_DEPTH)

    # Sketch4 → Cut-Extrude2 (cut)
    with BuildSketch(Plane(origin=(0, 6, 0), x_dir=(1, 0, 0), z_dir=(0, 1, 0))):
        with Locations(Location((170, 140, 0), (0, 0, 270))):
            Circle(SKETCH4_R)
        with Locations(Location((40, 140, 0), (0, 0, 270))):
            Circle(SKETCH4_R)
        with Locations(Location((170, 20, 0), (0, 0, 90))):
            Circle(SKETCH4_R)
        with Locations(Location((40, 20, 0), (0, 0, 90))):
            Circle(SKETCH4_R)
    extrude(amount=-CUT_EXTRUDE2_DEPTH, mode=Mode.SUBTRACT)

    # Sketch5 → Cut-Extrude7 (cut)
    with BuildSketch(Plane(origin=(0, 0, 0), x_dir=(1, 0, 0), z_dir=(0, 1, 0))):
        with Locations(Location((170, 140, 0), (0, 0, 270))):
            Circle(SKETCH5_R)
        with Locations(Location((40, 140, 0), (0, 0, 270))):
            Circle(SKETCH5_R)
        with Locations(Location((170, 20, 0), (0, 0, 90))):
            Circle(SKETCH5_R)
        with Locations(Location((40, 20, 0), (0, 0, 90))):
            Circle(SKETCH5_R)
    extrude(amount=CUT_EXTRUDE7_DEPTH, mode=Mode.SUBTRACT)


solid = part.part
